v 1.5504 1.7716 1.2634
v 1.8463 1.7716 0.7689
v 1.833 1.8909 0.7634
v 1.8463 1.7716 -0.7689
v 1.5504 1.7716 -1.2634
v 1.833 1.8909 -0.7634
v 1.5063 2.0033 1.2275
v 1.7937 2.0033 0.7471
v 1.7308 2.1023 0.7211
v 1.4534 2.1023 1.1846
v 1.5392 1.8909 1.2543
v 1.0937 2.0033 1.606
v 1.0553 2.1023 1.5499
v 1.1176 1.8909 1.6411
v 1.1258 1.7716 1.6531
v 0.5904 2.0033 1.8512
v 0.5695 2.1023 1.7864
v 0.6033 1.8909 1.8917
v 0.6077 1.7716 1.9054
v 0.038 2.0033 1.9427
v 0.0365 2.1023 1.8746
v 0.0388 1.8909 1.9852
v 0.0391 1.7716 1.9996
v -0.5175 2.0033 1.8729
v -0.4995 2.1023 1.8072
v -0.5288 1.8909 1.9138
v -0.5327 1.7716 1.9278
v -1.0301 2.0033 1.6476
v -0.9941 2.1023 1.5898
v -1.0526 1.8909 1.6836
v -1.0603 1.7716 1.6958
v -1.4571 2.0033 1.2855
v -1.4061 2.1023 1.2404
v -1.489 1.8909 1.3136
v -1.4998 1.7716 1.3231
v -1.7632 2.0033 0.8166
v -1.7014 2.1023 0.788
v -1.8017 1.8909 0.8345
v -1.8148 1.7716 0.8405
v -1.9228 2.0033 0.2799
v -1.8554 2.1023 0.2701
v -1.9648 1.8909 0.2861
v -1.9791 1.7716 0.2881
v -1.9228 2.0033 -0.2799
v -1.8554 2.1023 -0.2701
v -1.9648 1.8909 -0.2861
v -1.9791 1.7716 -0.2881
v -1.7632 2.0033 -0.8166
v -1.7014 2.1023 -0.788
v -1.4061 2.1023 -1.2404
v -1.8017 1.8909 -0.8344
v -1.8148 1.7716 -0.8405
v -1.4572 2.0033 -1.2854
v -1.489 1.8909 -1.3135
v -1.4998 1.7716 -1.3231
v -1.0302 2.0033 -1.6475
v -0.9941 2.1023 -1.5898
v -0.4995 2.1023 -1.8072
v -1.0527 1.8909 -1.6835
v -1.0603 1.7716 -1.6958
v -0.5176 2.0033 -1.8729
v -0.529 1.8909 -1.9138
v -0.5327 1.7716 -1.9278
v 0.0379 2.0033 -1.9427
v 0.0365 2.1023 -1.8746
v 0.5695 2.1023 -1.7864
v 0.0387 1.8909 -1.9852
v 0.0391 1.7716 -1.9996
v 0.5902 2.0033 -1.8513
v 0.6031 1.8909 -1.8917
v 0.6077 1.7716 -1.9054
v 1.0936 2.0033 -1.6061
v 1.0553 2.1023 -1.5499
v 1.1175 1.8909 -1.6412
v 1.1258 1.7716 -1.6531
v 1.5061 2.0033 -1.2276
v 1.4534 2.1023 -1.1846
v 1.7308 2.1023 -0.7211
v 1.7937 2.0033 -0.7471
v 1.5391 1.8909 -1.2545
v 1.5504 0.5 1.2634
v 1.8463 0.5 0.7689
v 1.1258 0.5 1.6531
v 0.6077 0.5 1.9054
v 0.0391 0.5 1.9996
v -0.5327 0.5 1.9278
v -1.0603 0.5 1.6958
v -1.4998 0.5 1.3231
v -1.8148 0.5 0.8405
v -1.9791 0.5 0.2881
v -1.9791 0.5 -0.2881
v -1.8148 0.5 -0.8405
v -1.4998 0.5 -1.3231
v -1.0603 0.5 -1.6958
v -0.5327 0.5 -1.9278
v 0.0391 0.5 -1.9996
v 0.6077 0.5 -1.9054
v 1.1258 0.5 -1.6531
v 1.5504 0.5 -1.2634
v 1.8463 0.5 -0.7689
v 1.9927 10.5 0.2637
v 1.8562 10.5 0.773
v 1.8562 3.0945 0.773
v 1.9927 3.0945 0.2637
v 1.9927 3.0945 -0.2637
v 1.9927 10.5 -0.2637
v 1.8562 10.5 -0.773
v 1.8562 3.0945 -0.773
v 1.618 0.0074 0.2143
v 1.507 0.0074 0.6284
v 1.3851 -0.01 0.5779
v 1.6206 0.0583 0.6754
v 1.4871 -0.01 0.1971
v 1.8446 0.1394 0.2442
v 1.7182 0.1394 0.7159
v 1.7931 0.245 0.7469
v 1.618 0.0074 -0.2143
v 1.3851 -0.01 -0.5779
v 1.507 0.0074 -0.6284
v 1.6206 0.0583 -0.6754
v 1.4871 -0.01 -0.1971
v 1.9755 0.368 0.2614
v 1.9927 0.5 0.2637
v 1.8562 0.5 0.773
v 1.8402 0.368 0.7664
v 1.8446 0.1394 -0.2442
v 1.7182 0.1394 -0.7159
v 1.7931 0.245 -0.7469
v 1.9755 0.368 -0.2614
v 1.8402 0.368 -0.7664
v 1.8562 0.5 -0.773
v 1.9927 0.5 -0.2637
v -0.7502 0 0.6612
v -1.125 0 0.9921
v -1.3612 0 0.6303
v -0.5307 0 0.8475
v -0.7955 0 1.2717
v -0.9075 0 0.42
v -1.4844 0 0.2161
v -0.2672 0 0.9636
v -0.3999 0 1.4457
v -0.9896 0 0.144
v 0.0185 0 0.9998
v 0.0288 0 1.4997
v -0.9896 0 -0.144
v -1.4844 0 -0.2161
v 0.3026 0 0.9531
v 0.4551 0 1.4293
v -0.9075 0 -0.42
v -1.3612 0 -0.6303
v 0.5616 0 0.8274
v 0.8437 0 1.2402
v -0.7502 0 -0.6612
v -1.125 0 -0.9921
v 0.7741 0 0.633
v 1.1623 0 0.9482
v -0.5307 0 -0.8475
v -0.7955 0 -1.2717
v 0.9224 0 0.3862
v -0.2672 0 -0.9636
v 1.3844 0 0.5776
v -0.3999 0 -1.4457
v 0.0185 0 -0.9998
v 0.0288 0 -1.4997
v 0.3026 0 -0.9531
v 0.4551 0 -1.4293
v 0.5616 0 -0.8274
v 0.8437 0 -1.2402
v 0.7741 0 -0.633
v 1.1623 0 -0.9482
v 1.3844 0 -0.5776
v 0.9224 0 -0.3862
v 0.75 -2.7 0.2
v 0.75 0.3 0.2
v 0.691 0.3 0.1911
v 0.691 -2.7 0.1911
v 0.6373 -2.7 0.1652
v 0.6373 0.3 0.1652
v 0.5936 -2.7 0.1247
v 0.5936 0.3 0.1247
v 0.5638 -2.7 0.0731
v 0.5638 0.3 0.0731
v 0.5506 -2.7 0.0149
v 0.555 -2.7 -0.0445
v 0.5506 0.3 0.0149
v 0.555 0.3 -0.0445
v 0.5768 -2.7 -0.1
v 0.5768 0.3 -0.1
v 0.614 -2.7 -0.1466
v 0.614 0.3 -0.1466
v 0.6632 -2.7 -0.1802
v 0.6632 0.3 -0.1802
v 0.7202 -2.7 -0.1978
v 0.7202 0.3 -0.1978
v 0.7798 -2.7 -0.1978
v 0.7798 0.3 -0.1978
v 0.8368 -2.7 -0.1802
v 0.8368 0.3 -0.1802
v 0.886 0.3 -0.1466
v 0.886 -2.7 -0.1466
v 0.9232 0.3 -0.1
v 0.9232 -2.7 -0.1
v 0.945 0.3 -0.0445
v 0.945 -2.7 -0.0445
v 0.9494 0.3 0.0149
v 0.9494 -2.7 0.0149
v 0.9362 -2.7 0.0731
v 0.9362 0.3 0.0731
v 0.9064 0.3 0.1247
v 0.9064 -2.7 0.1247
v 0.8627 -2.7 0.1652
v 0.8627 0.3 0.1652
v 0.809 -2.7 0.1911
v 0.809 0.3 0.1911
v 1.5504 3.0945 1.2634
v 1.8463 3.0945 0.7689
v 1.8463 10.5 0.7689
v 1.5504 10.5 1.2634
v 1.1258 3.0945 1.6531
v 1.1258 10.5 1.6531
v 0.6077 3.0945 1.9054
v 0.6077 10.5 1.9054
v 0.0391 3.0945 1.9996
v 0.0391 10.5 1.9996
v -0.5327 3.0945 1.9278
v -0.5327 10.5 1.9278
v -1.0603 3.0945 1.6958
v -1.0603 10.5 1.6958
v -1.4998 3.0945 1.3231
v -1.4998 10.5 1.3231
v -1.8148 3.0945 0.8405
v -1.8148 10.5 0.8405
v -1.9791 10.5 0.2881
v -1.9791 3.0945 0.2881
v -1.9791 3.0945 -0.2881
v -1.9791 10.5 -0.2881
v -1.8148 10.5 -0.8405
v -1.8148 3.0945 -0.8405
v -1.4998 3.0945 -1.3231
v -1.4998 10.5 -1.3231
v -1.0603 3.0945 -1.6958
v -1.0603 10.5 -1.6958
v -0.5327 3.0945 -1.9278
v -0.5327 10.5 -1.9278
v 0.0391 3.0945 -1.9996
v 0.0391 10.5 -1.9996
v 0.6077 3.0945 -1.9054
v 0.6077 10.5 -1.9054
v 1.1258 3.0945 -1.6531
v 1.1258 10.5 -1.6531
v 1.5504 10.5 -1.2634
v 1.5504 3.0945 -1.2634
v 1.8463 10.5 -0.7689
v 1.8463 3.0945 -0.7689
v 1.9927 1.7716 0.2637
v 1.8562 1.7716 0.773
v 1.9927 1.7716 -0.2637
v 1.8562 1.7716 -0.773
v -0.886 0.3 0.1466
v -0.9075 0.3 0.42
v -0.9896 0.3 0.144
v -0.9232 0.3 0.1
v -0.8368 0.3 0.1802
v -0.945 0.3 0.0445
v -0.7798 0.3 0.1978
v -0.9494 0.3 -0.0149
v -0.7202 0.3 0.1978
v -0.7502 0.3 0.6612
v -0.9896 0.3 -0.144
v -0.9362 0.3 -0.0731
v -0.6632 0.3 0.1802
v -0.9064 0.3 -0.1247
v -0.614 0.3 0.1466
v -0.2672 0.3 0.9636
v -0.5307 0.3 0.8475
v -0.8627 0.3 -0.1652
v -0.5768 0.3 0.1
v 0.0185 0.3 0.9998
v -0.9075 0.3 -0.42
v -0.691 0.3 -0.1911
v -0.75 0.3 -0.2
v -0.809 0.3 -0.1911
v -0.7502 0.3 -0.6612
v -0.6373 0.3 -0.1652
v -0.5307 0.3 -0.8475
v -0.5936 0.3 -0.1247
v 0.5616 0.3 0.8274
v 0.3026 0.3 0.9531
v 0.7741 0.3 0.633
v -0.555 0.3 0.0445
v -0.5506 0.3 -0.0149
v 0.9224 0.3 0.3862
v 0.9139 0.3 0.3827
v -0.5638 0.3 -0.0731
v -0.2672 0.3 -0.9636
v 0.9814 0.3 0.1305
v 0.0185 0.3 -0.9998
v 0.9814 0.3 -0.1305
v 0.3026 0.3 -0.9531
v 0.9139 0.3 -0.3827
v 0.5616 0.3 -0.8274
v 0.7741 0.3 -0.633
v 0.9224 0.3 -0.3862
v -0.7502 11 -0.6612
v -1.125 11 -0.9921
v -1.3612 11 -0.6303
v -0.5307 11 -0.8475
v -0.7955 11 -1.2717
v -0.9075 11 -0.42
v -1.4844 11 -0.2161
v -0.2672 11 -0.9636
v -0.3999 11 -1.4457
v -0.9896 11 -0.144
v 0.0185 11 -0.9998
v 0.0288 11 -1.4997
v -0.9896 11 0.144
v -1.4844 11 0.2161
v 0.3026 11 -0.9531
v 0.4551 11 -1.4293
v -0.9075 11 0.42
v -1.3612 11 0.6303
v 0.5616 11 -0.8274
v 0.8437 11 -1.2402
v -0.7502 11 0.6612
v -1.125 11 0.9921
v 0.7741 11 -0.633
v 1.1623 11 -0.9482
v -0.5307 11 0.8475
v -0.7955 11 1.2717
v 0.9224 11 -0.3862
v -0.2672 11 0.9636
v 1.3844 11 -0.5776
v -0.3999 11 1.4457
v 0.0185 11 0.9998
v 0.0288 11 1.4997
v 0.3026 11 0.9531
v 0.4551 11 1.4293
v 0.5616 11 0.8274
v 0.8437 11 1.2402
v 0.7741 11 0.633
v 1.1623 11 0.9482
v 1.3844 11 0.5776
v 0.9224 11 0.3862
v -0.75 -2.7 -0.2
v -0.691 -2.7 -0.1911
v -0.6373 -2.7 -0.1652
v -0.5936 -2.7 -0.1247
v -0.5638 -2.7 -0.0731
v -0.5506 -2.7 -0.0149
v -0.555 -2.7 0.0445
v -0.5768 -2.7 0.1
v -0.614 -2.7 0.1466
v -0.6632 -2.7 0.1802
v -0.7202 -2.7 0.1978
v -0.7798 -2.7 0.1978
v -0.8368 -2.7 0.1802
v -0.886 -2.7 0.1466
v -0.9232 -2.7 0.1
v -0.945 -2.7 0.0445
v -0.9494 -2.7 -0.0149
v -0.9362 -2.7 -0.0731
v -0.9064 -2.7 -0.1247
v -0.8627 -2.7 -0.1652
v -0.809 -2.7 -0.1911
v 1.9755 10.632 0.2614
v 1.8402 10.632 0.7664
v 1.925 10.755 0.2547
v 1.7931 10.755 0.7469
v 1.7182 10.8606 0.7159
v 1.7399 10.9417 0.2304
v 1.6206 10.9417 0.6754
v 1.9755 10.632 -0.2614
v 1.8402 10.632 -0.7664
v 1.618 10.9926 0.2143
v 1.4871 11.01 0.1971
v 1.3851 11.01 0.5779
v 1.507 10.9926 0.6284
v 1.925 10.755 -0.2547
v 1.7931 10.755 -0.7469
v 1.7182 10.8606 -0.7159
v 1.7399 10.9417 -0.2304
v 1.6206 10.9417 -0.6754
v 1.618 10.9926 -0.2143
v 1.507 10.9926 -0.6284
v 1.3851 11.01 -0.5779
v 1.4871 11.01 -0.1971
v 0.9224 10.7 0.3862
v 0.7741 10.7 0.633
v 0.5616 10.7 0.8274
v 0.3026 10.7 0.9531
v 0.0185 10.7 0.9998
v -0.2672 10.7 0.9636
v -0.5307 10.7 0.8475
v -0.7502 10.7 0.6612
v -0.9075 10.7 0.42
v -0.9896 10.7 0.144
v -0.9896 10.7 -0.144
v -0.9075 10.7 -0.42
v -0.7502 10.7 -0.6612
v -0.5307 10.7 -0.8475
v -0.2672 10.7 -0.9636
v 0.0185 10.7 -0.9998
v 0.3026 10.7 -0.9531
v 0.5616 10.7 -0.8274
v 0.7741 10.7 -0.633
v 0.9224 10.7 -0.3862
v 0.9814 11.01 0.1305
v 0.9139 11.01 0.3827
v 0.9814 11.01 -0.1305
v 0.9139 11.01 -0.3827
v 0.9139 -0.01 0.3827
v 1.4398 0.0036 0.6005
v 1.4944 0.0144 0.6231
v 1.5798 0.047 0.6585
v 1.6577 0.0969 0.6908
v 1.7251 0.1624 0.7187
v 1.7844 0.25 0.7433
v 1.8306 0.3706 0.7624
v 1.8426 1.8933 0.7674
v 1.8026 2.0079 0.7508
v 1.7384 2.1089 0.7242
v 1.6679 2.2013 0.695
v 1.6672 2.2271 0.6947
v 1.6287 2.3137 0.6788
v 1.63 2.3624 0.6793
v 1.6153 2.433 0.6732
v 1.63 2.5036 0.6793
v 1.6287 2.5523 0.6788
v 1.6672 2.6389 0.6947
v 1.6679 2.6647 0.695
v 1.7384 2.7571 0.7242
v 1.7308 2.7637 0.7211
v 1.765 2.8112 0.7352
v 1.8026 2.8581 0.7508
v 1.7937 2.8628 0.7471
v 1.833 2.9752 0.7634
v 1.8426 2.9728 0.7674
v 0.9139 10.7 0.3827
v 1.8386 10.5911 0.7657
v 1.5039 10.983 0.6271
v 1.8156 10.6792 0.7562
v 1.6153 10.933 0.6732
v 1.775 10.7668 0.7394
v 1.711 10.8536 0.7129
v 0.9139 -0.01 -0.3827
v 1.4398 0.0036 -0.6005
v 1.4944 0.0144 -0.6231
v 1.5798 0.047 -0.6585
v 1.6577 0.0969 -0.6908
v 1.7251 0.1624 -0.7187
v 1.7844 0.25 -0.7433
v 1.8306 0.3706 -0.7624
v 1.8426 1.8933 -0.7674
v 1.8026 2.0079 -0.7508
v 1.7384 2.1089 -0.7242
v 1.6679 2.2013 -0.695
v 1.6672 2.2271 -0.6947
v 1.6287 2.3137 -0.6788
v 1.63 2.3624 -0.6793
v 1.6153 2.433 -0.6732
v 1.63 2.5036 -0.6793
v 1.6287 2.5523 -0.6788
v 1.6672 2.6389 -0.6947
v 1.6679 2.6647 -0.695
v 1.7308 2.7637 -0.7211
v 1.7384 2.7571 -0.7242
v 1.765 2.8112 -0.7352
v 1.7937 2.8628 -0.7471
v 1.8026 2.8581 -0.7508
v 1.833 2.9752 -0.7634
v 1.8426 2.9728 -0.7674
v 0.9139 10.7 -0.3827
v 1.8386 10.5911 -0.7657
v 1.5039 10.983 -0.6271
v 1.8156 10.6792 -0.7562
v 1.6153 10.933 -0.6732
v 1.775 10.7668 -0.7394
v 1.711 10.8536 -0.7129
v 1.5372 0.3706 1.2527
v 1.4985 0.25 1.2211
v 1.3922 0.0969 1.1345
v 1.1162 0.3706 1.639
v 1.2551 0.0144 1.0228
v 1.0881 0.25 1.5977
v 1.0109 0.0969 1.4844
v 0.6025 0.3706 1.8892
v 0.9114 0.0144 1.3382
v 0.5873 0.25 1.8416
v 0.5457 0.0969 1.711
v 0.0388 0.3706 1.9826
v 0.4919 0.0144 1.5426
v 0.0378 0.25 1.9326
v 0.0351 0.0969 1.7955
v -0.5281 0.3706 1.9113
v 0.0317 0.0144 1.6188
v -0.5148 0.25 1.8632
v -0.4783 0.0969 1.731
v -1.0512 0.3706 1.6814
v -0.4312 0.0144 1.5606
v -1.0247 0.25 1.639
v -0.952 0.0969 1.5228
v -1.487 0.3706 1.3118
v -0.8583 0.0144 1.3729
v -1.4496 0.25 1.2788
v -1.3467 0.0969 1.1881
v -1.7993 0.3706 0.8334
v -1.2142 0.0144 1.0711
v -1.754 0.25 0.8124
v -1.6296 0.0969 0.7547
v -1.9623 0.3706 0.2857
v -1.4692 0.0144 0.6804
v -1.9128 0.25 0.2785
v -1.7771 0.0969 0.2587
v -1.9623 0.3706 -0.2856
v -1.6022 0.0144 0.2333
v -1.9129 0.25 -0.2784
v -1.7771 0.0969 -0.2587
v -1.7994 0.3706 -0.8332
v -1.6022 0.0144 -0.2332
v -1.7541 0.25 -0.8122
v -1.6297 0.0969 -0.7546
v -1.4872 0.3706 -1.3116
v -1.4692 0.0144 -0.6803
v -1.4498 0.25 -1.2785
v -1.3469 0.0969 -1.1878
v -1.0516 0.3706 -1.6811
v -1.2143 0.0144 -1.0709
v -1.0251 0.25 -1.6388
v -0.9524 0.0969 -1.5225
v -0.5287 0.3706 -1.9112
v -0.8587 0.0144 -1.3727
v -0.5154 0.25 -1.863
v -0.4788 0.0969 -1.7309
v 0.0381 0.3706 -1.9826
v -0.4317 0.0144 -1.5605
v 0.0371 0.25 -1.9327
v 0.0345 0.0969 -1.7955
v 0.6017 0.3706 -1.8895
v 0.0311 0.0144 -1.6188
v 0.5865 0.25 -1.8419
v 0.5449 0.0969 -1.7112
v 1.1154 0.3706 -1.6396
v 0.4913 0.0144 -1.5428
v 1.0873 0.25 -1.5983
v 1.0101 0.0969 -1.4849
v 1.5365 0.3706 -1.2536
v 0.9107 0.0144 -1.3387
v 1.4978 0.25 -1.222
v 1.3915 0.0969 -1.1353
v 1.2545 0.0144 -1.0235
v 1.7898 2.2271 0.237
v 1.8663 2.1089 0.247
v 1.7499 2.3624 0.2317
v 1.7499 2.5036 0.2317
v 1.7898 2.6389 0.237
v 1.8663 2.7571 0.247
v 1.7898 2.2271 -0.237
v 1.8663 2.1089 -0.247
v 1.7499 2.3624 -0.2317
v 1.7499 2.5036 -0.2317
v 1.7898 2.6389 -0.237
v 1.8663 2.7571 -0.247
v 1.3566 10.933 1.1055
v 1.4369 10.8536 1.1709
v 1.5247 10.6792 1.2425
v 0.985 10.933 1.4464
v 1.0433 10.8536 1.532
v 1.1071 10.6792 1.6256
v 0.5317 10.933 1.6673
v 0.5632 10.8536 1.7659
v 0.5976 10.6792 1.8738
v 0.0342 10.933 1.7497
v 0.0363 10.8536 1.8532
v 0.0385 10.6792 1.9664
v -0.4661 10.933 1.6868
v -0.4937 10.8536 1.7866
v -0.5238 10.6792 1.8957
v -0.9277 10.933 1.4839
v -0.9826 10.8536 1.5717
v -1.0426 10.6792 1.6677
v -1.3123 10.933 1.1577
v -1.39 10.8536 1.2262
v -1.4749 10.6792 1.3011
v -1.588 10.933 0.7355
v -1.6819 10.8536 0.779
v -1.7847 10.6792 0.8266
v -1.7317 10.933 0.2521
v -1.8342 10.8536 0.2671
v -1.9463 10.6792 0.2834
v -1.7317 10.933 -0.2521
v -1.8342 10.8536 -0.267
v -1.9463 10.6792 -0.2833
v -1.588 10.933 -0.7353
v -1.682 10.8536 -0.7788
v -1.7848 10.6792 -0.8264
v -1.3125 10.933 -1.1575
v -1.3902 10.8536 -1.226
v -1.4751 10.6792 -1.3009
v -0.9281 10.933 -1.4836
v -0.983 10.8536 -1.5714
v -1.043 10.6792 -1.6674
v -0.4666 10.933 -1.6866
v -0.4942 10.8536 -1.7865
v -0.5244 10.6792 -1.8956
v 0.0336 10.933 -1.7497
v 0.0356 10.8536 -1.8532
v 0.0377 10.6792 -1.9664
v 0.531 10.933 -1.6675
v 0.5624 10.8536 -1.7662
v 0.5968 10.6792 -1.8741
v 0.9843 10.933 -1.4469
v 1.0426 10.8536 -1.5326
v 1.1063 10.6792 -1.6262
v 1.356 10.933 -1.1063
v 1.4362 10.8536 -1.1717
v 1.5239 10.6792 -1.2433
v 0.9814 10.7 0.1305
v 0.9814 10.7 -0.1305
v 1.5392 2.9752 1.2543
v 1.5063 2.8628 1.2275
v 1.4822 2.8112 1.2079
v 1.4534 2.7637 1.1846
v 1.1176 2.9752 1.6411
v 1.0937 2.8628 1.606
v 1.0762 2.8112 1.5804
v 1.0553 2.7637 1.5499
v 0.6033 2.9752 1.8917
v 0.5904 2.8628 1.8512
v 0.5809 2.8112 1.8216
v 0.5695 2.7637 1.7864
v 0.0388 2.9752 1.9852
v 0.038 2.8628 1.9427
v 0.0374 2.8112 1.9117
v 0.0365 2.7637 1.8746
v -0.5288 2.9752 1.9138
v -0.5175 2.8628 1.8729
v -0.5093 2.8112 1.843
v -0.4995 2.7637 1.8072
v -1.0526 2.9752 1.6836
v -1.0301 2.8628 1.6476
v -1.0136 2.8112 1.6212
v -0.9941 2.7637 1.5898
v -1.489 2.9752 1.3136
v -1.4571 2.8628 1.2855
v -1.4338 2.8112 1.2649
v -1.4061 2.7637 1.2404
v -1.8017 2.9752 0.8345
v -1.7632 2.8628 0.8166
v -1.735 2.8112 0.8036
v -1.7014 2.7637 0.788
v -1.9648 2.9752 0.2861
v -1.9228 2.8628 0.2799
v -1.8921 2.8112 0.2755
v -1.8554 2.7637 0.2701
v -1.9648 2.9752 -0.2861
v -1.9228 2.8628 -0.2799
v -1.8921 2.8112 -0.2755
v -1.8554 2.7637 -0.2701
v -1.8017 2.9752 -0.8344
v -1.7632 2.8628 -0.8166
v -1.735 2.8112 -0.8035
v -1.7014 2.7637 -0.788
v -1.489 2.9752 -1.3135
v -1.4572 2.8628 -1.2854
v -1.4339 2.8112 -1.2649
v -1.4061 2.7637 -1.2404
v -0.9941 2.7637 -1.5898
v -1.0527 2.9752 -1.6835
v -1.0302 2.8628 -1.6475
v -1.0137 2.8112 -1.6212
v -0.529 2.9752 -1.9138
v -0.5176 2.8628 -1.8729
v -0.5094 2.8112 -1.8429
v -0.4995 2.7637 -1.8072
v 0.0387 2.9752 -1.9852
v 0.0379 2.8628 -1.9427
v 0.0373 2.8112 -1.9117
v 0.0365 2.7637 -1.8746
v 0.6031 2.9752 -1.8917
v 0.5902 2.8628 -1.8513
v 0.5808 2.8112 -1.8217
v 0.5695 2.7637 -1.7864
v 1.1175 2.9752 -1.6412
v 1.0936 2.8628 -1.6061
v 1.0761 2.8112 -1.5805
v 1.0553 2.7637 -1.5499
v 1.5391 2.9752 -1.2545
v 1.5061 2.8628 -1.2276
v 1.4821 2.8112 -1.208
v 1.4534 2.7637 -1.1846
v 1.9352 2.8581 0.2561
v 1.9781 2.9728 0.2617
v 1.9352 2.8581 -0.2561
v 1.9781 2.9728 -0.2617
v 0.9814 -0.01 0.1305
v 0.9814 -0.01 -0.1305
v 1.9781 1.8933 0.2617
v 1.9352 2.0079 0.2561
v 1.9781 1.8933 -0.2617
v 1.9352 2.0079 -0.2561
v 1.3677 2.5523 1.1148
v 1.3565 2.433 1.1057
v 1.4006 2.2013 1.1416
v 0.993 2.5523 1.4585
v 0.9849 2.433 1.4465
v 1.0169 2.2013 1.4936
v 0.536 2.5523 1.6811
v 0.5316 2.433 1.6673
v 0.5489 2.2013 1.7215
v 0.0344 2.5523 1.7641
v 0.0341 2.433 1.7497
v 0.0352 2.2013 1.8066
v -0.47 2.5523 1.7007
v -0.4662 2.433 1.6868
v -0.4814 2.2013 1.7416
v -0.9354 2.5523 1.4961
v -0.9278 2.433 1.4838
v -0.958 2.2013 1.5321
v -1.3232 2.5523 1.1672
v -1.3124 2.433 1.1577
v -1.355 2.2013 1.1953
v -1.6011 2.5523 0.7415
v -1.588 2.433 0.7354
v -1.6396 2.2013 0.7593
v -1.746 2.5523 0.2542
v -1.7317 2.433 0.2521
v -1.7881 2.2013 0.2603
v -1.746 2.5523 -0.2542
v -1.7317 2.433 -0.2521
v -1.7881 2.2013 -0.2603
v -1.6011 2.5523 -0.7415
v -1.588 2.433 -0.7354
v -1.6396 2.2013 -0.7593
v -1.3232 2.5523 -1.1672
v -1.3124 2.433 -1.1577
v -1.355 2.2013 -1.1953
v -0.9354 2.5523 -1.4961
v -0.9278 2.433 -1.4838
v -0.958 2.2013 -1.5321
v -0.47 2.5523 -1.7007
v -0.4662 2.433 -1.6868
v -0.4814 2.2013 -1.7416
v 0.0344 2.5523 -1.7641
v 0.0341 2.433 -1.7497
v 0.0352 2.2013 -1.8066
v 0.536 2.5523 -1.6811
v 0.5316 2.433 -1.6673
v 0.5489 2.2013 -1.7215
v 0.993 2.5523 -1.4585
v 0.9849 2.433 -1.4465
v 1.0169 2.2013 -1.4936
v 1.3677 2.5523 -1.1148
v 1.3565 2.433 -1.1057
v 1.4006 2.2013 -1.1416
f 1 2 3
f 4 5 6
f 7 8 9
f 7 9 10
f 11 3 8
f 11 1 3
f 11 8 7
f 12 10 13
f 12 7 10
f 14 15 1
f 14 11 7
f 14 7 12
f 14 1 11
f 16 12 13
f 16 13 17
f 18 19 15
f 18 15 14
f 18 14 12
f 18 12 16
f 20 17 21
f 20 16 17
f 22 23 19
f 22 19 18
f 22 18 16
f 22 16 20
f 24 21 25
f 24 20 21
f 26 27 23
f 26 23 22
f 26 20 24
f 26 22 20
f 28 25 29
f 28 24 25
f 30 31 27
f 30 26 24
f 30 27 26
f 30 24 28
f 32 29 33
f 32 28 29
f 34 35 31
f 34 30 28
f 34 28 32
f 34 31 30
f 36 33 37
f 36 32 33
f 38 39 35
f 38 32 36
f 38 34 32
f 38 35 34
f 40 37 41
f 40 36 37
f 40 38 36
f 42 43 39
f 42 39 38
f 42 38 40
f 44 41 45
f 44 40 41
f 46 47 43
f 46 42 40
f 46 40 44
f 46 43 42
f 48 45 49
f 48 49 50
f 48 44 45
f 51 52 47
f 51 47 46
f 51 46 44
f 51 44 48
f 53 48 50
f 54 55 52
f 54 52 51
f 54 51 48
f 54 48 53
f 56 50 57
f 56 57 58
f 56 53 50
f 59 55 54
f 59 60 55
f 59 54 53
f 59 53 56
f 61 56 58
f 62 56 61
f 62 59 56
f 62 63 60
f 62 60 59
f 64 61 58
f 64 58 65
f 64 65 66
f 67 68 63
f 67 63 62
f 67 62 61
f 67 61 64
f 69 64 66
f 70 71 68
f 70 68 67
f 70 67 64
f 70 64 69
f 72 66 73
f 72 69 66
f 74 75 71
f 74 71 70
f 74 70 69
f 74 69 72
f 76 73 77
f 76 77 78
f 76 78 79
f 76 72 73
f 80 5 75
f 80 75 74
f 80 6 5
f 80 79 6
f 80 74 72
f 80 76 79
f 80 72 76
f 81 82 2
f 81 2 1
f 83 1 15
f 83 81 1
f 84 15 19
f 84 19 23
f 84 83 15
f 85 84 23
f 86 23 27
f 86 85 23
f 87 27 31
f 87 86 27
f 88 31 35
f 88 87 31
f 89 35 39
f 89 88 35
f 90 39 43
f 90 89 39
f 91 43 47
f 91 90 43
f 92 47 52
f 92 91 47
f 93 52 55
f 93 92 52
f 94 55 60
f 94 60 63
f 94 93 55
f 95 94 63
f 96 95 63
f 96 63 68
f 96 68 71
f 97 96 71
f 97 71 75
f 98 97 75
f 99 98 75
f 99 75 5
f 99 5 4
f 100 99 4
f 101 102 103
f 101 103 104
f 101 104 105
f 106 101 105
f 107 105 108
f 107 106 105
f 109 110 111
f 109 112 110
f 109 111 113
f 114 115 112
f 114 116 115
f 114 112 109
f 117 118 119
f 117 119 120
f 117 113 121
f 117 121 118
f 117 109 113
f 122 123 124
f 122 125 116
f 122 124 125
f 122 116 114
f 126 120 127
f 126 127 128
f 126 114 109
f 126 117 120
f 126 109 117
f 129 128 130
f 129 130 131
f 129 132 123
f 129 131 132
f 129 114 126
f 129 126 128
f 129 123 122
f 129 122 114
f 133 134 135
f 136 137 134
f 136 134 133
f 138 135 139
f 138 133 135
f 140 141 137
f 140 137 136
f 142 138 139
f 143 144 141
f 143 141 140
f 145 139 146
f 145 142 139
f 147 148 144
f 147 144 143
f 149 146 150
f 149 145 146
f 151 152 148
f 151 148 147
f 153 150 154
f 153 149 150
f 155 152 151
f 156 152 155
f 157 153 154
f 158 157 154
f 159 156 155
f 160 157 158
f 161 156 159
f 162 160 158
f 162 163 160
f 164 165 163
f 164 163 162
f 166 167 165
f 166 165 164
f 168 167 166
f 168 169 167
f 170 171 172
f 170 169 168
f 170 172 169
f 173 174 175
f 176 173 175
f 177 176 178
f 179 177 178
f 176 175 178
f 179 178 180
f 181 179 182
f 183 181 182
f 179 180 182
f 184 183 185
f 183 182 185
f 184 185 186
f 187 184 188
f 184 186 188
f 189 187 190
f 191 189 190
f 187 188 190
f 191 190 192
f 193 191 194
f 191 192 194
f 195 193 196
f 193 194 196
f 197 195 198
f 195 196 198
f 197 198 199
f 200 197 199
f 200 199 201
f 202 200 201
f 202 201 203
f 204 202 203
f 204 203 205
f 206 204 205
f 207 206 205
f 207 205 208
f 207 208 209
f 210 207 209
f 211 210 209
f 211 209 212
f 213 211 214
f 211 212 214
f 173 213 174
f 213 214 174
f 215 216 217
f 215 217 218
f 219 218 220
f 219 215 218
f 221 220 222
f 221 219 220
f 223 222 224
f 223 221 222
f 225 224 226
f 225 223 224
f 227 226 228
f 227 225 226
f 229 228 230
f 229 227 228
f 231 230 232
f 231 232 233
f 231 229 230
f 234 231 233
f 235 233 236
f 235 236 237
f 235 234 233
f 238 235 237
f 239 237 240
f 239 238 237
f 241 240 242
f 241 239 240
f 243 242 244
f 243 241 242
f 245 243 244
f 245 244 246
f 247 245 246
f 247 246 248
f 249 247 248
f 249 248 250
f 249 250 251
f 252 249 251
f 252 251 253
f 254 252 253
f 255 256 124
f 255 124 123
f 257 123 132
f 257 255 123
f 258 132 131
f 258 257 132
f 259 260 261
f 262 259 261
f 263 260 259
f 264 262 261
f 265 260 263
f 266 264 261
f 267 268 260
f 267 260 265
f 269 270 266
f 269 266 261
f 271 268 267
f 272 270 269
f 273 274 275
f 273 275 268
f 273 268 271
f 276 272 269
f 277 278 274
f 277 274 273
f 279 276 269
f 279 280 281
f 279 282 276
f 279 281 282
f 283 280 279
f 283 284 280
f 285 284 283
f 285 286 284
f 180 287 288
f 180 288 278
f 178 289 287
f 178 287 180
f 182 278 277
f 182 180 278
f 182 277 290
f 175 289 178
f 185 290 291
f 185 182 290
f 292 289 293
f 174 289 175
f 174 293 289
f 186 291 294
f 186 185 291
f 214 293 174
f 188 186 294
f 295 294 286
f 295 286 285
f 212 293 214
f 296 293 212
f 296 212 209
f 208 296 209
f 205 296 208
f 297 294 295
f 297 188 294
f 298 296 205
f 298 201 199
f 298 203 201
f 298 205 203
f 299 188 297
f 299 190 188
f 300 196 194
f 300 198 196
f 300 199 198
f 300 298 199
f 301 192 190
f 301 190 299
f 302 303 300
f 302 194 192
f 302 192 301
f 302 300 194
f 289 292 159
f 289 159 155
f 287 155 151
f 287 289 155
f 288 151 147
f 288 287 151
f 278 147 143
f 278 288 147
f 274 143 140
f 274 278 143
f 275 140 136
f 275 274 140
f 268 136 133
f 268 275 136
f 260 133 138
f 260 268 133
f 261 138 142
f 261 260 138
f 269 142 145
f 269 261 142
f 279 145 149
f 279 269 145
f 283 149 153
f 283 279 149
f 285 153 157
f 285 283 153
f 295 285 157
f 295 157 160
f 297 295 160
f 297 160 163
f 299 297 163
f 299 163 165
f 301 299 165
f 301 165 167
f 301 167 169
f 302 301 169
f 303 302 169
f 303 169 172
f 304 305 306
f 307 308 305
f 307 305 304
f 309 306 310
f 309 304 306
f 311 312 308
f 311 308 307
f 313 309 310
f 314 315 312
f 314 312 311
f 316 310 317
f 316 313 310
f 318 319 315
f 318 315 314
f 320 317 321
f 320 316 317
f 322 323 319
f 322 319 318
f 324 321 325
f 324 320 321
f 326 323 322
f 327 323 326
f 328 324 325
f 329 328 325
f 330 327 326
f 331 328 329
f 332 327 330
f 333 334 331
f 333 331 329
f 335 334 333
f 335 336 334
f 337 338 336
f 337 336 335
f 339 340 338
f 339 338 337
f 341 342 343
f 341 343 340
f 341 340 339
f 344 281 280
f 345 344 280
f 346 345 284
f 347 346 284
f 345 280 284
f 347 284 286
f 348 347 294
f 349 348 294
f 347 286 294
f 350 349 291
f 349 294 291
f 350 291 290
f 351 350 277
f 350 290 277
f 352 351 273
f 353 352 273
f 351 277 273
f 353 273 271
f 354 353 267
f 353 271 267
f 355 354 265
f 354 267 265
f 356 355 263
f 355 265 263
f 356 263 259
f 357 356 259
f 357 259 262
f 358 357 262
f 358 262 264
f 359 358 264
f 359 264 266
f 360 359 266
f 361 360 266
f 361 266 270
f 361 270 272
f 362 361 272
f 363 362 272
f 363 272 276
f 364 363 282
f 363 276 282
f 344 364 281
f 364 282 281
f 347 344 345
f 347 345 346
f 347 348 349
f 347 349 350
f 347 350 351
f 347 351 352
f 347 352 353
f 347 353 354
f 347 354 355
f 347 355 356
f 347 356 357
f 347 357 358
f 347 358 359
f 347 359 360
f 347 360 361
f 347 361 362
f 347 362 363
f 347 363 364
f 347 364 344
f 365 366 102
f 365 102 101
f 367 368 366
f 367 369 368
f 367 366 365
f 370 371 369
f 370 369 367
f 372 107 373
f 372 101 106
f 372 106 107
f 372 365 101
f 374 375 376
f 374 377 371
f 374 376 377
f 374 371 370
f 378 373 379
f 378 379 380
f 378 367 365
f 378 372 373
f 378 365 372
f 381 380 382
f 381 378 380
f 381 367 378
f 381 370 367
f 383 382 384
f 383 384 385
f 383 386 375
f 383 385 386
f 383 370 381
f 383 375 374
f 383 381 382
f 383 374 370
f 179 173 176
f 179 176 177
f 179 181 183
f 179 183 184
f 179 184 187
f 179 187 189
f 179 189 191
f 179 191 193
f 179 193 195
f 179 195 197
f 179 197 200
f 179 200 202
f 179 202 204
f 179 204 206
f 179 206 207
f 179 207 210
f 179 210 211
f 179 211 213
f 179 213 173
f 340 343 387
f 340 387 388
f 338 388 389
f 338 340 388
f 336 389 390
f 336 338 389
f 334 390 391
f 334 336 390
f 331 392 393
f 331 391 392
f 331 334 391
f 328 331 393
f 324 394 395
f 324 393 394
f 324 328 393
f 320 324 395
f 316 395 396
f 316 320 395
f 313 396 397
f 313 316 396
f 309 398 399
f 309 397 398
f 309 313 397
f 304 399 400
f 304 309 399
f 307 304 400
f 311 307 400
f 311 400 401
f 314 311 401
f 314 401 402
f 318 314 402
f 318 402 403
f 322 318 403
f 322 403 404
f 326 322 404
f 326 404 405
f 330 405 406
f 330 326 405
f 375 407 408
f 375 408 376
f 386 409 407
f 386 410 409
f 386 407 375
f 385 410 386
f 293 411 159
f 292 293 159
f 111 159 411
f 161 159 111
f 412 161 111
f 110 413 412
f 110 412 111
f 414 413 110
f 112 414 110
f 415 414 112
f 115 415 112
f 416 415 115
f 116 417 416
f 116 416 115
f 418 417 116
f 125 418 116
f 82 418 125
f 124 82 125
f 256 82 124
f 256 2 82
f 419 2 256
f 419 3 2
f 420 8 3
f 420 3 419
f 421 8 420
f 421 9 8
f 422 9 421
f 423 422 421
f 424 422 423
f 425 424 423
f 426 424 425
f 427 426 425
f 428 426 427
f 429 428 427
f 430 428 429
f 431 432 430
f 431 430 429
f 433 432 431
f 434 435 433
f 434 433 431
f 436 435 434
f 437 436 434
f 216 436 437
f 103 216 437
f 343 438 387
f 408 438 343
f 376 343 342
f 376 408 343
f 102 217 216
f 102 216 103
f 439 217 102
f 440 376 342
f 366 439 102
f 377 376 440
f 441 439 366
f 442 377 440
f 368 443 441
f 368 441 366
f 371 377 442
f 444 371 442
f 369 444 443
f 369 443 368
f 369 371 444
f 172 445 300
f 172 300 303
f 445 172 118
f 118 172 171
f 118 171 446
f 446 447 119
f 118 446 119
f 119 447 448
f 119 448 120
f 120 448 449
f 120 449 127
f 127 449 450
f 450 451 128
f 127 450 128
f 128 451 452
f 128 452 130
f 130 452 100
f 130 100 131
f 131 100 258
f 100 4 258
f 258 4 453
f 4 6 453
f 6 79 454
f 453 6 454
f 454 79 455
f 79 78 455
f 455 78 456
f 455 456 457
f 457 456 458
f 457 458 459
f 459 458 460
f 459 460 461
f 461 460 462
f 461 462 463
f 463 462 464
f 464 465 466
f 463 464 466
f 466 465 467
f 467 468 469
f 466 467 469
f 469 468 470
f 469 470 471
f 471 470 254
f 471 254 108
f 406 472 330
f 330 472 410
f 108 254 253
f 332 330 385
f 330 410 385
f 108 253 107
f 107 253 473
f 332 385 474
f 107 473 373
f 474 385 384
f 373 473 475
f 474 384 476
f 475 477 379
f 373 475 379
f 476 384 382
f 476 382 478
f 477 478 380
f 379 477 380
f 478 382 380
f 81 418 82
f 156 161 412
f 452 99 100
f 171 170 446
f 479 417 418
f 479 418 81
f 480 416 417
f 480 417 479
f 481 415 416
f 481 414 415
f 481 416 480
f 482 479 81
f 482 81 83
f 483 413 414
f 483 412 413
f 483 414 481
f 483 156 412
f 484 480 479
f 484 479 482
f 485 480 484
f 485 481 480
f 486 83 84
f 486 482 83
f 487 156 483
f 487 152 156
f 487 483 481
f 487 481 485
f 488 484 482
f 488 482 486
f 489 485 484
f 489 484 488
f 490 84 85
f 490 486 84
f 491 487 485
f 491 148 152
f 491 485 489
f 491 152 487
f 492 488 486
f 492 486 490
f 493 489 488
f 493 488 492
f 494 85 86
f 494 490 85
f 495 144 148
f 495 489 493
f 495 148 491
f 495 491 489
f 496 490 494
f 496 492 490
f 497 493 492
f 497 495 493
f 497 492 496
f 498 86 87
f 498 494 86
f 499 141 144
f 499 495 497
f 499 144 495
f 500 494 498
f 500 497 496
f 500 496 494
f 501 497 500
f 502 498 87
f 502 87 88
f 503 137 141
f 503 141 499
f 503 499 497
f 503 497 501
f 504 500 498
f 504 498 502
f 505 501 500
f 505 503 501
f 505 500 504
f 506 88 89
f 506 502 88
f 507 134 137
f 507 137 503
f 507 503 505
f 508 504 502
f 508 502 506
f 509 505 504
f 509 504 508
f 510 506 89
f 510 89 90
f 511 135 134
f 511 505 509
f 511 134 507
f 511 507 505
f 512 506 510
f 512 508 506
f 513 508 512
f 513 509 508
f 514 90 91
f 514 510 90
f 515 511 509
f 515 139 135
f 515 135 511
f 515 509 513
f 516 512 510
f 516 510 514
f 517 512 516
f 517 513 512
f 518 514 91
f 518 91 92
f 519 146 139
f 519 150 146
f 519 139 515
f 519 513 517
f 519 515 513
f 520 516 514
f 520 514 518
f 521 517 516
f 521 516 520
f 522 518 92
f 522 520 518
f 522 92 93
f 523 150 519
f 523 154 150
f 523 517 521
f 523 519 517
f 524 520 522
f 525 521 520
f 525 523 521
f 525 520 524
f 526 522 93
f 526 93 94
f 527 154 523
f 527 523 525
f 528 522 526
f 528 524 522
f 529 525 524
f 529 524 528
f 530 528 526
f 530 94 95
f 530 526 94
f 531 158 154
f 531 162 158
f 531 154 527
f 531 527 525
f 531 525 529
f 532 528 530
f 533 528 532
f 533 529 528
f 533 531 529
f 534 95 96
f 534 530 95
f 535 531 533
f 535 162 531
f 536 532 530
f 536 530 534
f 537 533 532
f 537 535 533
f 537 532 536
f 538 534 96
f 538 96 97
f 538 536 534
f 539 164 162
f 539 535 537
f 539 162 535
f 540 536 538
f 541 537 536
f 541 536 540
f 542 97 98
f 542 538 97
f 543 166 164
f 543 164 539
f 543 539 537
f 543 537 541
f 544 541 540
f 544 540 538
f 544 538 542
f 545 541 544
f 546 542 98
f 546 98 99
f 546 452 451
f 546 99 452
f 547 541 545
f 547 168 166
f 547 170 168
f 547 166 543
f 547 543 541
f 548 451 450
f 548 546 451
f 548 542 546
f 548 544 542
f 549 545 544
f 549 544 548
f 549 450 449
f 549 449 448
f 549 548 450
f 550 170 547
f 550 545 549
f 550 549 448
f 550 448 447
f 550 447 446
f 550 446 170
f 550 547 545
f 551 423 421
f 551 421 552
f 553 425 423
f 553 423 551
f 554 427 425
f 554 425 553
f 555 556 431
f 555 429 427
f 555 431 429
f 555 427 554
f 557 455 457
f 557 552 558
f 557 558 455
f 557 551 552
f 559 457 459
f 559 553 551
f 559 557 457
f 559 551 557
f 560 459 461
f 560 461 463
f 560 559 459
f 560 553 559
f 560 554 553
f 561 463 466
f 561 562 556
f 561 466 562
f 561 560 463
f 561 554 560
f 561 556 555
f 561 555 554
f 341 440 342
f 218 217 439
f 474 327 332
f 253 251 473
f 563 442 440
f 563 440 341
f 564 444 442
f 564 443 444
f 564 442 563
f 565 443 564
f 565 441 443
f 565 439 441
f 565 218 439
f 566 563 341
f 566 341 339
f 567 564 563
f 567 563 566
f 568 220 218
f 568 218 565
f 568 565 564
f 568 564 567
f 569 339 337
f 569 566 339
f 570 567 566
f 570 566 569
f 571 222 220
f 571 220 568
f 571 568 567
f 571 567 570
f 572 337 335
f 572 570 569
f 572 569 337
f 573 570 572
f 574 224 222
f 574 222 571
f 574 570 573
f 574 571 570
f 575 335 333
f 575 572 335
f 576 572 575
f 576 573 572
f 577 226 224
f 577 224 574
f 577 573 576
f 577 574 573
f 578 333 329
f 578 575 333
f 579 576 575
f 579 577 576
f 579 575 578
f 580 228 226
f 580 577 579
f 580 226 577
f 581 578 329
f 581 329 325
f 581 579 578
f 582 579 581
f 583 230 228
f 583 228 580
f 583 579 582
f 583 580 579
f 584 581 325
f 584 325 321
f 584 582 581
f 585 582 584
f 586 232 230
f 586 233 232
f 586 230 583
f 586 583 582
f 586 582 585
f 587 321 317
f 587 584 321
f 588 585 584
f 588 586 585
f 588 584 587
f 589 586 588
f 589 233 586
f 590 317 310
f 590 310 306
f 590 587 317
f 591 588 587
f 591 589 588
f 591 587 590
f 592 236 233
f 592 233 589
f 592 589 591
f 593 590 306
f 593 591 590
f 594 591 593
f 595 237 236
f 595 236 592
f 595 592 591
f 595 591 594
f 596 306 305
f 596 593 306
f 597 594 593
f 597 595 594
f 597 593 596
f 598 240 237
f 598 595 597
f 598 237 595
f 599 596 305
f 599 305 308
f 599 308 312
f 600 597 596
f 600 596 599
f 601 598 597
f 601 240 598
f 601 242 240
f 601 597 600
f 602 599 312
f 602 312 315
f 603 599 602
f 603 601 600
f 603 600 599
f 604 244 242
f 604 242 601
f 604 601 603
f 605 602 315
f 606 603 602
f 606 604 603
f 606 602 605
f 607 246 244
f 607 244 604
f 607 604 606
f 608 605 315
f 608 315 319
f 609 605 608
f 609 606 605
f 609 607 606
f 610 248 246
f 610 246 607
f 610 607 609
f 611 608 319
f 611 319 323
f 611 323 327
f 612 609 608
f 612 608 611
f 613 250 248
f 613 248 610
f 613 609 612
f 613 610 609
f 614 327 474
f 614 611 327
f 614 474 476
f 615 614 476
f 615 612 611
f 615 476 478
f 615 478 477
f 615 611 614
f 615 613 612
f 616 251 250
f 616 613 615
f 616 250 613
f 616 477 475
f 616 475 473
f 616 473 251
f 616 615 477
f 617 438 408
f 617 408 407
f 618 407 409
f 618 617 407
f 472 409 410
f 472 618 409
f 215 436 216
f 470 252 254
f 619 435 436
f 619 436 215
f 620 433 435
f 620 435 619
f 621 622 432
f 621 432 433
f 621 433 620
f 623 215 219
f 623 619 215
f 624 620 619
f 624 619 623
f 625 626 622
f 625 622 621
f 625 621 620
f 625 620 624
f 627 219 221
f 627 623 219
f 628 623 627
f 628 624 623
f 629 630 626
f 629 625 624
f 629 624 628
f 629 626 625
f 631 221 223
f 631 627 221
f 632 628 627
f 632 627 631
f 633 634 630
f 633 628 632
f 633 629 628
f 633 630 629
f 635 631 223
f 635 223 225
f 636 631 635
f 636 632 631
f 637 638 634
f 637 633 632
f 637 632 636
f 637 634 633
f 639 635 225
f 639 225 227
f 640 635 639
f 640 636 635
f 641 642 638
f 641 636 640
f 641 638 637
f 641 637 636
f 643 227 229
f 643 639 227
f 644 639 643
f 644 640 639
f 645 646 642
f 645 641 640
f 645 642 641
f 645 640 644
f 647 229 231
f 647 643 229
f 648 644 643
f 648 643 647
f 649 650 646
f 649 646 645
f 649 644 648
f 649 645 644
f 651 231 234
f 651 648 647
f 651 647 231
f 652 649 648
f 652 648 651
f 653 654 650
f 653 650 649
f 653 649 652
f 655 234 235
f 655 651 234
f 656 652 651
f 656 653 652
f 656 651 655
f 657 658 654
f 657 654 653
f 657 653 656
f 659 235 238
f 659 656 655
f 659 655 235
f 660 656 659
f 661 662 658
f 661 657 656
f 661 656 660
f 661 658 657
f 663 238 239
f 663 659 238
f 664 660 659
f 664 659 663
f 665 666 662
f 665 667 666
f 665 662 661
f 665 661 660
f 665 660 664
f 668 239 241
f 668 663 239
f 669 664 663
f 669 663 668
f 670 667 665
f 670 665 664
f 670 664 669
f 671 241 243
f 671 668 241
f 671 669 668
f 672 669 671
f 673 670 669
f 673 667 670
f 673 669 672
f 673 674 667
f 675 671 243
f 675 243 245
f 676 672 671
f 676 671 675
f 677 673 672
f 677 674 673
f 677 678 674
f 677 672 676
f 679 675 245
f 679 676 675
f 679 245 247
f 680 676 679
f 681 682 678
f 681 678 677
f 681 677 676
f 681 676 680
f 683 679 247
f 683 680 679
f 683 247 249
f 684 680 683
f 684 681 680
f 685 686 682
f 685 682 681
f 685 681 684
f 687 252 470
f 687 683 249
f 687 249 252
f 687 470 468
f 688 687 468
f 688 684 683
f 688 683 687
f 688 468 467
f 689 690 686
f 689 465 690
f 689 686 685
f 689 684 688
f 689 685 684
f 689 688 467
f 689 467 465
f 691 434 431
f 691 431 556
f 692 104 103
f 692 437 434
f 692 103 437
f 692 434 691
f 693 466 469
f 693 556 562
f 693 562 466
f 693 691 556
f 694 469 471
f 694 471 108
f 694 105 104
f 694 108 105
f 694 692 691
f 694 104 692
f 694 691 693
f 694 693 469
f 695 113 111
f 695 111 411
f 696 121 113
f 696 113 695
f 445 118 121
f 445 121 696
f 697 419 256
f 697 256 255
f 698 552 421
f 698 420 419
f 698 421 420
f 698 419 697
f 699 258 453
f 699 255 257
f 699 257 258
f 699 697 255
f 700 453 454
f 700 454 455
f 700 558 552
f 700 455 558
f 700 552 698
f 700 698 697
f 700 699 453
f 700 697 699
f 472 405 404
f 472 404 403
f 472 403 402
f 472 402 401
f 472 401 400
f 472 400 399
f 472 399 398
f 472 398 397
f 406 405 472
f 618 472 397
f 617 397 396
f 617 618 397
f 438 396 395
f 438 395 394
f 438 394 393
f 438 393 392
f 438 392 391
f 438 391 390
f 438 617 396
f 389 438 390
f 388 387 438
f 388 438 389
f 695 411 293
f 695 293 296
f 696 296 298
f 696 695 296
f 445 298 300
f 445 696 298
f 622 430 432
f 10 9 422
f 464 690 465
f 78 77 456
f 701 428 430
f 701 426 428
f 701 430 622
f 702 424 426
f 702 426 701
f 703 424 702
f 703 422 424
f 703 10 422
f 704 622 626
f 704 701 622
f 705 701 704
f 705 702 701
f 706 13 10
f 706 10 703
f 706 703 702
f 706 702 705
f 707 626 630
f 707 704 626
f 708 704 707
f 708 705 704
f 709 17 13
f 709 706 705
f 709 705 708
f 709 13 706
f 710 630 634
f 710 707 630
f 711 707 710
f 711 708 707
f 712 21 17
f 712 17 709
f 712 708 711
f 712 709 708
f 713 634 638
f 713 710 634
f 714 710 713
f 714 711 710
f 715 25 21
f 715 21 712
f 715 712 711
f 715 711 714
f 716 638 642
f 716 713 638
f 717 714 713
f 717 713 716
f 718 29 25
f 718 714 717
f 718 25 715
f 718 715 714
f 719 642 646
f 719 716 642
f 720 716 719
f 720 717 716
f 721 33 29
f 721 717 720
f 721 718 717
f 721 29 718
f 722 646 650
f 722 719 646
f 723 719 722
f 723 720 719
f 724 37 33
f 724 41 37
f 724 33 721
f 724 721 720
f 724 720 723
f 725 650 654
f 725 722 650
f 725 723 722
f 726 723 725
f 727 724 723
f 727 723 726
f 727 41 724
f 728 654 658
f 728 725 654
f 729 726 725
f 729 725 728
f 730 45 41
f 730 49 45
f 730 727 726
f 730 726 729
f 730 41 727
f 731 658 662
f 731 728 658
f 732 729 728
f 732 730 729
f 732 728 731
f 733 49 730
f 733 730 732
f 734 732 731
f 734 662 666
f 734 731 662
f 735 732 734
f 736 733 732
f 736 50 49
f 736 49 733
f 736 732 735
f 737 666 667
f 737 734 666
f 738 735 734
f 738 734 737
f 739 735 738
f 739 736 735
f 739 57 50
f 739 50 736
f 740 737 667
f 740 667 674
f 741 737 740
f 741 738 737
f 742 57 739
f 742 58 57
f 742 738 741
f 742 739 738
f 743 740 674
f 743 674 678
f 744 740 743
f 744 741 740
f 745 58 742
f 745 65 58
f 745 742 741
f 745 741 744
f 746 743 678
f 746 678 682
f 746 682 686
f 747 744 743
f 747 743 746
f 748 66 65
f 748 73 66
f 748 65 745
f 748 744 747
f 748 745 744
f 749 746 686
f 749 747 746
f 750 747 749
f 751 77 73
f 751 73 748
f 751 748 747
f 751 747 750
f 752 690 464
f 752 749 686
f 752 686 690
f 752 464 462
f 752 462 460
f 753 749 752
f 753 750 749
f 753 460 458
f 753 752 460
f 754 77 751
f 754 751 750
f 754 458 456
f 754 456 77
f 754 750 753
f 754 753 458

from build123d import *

# Parameters (mm, degrees)
SKETCH2_R      = 0.2
EXTRUDE1_DEPTH = 3
REVOLVE2_ANGLE = 45


with BuildPart() as part:
    # Sketch1 → Revolve1 (revolve)
    with BuildSketch(Plane.XY, mode=Mode.PRIVATE) as revolve1_sk:
        with BuildLine():
            Line((0, 0.3), (0, 10.7))
            Line((0, 10.7), (1, 10.7))
            Line((1, 10.7), (1, 11))
            Line((1, 11), (1.5, 11))
            ThreePointArc((1.5, 11), (1.853553391, 10.853553391), (2, 10.5))
            Line((2, 10.5), (2, 3.09445053))
            ThreePointArc((2, 3.09445053), (1.967707173, 2.917673834), (1.875, 2.763731616))
            ThreePointArc((1.875, 2.763731616), (1.75, 2.433012702), (1.875, 2.102293788))
            ThreePointArc((1.875, 2.102293788), (1.967707173, 1.948351569), (2, 1.771574874))
            Line((2, 1.771574874), (2, 0.5))
            ThreePointArc((2, 0.5), (1.853553391, 0.146446609), (1.5, 0))
            Line((1.5, 0), (1, 0))
            Line((1, 0), (1, 0.3))
            Line((1, 0.3), (0, 0.3))
        make_face()
    revolve(revolve1_sk.sketch.rotate(Axis((0, 0, 0), (0, -1, 0)), 270), axis=Axis((0, 0, 0), (0, -1, 0)))

    # Sketch2 → Extrude1 (add)
    with BuildSketch(Plane.XZ.offset(-0.3)):
        with Locations(Location((-0.75, 0, 0), (0, 0, 270))):
            Circle(SKETCH2_R)
        with Locations(Location((0.75, 0, 0), (0, 0, 90))):
            Circle(SKETCH2_R)
    extrude(amount=EXTRUDE1_DEPTH)

    # Sketch3 → Revolve2 (revolve, symmetric)
    with BuildSketch(Plane.XY) as revolve2_sk:
        with BuildLine():
            Line((0.99, 11.01), (0.99, -0.01))
            Line((0.99, -0.01), (1.5, -0.01))
            ThreePointArc((1.5, -0.01), (1.860624458, 0.139375542), (2.01, 0.5))
            Line((2.01, 0.5), (2.01, 1.771574874))
            ThreePointArc((2.01, 1.771574874), (1.977061317, 1.951887103), (1.8825, 2.108908166))
            ThreePointArc((1.8825, 2.108908166), (1.76, 2.433012702), (1.8825, 2.757117237))
            ThreePointArc((1.8825, 2.757117237), (1.977061317, 2.9141383), (2.01, 3.09445053))
            Line((2.01, 3.09445053), (2.01, 10.5))
            ThreePointArc((2.01, 10.5), (1.860624458, 10.860624458), (1.5, 11.01))
            Line((1.5, 11.01), (0.99, 11.01))
        make_face()
    revolve(axis=Axis((-0.01, 10.71, 0), (0, -1, 0)), revolution_arc=REVOLVE2_ANGLE / 2)
    revolve(revolve2_sk.sketch, axis=Axis((-0.01, 10.71, 0), (0, 1, 0)), revolution_arc=REVOLVE2_ANGLE / 2)


solid = part.part
